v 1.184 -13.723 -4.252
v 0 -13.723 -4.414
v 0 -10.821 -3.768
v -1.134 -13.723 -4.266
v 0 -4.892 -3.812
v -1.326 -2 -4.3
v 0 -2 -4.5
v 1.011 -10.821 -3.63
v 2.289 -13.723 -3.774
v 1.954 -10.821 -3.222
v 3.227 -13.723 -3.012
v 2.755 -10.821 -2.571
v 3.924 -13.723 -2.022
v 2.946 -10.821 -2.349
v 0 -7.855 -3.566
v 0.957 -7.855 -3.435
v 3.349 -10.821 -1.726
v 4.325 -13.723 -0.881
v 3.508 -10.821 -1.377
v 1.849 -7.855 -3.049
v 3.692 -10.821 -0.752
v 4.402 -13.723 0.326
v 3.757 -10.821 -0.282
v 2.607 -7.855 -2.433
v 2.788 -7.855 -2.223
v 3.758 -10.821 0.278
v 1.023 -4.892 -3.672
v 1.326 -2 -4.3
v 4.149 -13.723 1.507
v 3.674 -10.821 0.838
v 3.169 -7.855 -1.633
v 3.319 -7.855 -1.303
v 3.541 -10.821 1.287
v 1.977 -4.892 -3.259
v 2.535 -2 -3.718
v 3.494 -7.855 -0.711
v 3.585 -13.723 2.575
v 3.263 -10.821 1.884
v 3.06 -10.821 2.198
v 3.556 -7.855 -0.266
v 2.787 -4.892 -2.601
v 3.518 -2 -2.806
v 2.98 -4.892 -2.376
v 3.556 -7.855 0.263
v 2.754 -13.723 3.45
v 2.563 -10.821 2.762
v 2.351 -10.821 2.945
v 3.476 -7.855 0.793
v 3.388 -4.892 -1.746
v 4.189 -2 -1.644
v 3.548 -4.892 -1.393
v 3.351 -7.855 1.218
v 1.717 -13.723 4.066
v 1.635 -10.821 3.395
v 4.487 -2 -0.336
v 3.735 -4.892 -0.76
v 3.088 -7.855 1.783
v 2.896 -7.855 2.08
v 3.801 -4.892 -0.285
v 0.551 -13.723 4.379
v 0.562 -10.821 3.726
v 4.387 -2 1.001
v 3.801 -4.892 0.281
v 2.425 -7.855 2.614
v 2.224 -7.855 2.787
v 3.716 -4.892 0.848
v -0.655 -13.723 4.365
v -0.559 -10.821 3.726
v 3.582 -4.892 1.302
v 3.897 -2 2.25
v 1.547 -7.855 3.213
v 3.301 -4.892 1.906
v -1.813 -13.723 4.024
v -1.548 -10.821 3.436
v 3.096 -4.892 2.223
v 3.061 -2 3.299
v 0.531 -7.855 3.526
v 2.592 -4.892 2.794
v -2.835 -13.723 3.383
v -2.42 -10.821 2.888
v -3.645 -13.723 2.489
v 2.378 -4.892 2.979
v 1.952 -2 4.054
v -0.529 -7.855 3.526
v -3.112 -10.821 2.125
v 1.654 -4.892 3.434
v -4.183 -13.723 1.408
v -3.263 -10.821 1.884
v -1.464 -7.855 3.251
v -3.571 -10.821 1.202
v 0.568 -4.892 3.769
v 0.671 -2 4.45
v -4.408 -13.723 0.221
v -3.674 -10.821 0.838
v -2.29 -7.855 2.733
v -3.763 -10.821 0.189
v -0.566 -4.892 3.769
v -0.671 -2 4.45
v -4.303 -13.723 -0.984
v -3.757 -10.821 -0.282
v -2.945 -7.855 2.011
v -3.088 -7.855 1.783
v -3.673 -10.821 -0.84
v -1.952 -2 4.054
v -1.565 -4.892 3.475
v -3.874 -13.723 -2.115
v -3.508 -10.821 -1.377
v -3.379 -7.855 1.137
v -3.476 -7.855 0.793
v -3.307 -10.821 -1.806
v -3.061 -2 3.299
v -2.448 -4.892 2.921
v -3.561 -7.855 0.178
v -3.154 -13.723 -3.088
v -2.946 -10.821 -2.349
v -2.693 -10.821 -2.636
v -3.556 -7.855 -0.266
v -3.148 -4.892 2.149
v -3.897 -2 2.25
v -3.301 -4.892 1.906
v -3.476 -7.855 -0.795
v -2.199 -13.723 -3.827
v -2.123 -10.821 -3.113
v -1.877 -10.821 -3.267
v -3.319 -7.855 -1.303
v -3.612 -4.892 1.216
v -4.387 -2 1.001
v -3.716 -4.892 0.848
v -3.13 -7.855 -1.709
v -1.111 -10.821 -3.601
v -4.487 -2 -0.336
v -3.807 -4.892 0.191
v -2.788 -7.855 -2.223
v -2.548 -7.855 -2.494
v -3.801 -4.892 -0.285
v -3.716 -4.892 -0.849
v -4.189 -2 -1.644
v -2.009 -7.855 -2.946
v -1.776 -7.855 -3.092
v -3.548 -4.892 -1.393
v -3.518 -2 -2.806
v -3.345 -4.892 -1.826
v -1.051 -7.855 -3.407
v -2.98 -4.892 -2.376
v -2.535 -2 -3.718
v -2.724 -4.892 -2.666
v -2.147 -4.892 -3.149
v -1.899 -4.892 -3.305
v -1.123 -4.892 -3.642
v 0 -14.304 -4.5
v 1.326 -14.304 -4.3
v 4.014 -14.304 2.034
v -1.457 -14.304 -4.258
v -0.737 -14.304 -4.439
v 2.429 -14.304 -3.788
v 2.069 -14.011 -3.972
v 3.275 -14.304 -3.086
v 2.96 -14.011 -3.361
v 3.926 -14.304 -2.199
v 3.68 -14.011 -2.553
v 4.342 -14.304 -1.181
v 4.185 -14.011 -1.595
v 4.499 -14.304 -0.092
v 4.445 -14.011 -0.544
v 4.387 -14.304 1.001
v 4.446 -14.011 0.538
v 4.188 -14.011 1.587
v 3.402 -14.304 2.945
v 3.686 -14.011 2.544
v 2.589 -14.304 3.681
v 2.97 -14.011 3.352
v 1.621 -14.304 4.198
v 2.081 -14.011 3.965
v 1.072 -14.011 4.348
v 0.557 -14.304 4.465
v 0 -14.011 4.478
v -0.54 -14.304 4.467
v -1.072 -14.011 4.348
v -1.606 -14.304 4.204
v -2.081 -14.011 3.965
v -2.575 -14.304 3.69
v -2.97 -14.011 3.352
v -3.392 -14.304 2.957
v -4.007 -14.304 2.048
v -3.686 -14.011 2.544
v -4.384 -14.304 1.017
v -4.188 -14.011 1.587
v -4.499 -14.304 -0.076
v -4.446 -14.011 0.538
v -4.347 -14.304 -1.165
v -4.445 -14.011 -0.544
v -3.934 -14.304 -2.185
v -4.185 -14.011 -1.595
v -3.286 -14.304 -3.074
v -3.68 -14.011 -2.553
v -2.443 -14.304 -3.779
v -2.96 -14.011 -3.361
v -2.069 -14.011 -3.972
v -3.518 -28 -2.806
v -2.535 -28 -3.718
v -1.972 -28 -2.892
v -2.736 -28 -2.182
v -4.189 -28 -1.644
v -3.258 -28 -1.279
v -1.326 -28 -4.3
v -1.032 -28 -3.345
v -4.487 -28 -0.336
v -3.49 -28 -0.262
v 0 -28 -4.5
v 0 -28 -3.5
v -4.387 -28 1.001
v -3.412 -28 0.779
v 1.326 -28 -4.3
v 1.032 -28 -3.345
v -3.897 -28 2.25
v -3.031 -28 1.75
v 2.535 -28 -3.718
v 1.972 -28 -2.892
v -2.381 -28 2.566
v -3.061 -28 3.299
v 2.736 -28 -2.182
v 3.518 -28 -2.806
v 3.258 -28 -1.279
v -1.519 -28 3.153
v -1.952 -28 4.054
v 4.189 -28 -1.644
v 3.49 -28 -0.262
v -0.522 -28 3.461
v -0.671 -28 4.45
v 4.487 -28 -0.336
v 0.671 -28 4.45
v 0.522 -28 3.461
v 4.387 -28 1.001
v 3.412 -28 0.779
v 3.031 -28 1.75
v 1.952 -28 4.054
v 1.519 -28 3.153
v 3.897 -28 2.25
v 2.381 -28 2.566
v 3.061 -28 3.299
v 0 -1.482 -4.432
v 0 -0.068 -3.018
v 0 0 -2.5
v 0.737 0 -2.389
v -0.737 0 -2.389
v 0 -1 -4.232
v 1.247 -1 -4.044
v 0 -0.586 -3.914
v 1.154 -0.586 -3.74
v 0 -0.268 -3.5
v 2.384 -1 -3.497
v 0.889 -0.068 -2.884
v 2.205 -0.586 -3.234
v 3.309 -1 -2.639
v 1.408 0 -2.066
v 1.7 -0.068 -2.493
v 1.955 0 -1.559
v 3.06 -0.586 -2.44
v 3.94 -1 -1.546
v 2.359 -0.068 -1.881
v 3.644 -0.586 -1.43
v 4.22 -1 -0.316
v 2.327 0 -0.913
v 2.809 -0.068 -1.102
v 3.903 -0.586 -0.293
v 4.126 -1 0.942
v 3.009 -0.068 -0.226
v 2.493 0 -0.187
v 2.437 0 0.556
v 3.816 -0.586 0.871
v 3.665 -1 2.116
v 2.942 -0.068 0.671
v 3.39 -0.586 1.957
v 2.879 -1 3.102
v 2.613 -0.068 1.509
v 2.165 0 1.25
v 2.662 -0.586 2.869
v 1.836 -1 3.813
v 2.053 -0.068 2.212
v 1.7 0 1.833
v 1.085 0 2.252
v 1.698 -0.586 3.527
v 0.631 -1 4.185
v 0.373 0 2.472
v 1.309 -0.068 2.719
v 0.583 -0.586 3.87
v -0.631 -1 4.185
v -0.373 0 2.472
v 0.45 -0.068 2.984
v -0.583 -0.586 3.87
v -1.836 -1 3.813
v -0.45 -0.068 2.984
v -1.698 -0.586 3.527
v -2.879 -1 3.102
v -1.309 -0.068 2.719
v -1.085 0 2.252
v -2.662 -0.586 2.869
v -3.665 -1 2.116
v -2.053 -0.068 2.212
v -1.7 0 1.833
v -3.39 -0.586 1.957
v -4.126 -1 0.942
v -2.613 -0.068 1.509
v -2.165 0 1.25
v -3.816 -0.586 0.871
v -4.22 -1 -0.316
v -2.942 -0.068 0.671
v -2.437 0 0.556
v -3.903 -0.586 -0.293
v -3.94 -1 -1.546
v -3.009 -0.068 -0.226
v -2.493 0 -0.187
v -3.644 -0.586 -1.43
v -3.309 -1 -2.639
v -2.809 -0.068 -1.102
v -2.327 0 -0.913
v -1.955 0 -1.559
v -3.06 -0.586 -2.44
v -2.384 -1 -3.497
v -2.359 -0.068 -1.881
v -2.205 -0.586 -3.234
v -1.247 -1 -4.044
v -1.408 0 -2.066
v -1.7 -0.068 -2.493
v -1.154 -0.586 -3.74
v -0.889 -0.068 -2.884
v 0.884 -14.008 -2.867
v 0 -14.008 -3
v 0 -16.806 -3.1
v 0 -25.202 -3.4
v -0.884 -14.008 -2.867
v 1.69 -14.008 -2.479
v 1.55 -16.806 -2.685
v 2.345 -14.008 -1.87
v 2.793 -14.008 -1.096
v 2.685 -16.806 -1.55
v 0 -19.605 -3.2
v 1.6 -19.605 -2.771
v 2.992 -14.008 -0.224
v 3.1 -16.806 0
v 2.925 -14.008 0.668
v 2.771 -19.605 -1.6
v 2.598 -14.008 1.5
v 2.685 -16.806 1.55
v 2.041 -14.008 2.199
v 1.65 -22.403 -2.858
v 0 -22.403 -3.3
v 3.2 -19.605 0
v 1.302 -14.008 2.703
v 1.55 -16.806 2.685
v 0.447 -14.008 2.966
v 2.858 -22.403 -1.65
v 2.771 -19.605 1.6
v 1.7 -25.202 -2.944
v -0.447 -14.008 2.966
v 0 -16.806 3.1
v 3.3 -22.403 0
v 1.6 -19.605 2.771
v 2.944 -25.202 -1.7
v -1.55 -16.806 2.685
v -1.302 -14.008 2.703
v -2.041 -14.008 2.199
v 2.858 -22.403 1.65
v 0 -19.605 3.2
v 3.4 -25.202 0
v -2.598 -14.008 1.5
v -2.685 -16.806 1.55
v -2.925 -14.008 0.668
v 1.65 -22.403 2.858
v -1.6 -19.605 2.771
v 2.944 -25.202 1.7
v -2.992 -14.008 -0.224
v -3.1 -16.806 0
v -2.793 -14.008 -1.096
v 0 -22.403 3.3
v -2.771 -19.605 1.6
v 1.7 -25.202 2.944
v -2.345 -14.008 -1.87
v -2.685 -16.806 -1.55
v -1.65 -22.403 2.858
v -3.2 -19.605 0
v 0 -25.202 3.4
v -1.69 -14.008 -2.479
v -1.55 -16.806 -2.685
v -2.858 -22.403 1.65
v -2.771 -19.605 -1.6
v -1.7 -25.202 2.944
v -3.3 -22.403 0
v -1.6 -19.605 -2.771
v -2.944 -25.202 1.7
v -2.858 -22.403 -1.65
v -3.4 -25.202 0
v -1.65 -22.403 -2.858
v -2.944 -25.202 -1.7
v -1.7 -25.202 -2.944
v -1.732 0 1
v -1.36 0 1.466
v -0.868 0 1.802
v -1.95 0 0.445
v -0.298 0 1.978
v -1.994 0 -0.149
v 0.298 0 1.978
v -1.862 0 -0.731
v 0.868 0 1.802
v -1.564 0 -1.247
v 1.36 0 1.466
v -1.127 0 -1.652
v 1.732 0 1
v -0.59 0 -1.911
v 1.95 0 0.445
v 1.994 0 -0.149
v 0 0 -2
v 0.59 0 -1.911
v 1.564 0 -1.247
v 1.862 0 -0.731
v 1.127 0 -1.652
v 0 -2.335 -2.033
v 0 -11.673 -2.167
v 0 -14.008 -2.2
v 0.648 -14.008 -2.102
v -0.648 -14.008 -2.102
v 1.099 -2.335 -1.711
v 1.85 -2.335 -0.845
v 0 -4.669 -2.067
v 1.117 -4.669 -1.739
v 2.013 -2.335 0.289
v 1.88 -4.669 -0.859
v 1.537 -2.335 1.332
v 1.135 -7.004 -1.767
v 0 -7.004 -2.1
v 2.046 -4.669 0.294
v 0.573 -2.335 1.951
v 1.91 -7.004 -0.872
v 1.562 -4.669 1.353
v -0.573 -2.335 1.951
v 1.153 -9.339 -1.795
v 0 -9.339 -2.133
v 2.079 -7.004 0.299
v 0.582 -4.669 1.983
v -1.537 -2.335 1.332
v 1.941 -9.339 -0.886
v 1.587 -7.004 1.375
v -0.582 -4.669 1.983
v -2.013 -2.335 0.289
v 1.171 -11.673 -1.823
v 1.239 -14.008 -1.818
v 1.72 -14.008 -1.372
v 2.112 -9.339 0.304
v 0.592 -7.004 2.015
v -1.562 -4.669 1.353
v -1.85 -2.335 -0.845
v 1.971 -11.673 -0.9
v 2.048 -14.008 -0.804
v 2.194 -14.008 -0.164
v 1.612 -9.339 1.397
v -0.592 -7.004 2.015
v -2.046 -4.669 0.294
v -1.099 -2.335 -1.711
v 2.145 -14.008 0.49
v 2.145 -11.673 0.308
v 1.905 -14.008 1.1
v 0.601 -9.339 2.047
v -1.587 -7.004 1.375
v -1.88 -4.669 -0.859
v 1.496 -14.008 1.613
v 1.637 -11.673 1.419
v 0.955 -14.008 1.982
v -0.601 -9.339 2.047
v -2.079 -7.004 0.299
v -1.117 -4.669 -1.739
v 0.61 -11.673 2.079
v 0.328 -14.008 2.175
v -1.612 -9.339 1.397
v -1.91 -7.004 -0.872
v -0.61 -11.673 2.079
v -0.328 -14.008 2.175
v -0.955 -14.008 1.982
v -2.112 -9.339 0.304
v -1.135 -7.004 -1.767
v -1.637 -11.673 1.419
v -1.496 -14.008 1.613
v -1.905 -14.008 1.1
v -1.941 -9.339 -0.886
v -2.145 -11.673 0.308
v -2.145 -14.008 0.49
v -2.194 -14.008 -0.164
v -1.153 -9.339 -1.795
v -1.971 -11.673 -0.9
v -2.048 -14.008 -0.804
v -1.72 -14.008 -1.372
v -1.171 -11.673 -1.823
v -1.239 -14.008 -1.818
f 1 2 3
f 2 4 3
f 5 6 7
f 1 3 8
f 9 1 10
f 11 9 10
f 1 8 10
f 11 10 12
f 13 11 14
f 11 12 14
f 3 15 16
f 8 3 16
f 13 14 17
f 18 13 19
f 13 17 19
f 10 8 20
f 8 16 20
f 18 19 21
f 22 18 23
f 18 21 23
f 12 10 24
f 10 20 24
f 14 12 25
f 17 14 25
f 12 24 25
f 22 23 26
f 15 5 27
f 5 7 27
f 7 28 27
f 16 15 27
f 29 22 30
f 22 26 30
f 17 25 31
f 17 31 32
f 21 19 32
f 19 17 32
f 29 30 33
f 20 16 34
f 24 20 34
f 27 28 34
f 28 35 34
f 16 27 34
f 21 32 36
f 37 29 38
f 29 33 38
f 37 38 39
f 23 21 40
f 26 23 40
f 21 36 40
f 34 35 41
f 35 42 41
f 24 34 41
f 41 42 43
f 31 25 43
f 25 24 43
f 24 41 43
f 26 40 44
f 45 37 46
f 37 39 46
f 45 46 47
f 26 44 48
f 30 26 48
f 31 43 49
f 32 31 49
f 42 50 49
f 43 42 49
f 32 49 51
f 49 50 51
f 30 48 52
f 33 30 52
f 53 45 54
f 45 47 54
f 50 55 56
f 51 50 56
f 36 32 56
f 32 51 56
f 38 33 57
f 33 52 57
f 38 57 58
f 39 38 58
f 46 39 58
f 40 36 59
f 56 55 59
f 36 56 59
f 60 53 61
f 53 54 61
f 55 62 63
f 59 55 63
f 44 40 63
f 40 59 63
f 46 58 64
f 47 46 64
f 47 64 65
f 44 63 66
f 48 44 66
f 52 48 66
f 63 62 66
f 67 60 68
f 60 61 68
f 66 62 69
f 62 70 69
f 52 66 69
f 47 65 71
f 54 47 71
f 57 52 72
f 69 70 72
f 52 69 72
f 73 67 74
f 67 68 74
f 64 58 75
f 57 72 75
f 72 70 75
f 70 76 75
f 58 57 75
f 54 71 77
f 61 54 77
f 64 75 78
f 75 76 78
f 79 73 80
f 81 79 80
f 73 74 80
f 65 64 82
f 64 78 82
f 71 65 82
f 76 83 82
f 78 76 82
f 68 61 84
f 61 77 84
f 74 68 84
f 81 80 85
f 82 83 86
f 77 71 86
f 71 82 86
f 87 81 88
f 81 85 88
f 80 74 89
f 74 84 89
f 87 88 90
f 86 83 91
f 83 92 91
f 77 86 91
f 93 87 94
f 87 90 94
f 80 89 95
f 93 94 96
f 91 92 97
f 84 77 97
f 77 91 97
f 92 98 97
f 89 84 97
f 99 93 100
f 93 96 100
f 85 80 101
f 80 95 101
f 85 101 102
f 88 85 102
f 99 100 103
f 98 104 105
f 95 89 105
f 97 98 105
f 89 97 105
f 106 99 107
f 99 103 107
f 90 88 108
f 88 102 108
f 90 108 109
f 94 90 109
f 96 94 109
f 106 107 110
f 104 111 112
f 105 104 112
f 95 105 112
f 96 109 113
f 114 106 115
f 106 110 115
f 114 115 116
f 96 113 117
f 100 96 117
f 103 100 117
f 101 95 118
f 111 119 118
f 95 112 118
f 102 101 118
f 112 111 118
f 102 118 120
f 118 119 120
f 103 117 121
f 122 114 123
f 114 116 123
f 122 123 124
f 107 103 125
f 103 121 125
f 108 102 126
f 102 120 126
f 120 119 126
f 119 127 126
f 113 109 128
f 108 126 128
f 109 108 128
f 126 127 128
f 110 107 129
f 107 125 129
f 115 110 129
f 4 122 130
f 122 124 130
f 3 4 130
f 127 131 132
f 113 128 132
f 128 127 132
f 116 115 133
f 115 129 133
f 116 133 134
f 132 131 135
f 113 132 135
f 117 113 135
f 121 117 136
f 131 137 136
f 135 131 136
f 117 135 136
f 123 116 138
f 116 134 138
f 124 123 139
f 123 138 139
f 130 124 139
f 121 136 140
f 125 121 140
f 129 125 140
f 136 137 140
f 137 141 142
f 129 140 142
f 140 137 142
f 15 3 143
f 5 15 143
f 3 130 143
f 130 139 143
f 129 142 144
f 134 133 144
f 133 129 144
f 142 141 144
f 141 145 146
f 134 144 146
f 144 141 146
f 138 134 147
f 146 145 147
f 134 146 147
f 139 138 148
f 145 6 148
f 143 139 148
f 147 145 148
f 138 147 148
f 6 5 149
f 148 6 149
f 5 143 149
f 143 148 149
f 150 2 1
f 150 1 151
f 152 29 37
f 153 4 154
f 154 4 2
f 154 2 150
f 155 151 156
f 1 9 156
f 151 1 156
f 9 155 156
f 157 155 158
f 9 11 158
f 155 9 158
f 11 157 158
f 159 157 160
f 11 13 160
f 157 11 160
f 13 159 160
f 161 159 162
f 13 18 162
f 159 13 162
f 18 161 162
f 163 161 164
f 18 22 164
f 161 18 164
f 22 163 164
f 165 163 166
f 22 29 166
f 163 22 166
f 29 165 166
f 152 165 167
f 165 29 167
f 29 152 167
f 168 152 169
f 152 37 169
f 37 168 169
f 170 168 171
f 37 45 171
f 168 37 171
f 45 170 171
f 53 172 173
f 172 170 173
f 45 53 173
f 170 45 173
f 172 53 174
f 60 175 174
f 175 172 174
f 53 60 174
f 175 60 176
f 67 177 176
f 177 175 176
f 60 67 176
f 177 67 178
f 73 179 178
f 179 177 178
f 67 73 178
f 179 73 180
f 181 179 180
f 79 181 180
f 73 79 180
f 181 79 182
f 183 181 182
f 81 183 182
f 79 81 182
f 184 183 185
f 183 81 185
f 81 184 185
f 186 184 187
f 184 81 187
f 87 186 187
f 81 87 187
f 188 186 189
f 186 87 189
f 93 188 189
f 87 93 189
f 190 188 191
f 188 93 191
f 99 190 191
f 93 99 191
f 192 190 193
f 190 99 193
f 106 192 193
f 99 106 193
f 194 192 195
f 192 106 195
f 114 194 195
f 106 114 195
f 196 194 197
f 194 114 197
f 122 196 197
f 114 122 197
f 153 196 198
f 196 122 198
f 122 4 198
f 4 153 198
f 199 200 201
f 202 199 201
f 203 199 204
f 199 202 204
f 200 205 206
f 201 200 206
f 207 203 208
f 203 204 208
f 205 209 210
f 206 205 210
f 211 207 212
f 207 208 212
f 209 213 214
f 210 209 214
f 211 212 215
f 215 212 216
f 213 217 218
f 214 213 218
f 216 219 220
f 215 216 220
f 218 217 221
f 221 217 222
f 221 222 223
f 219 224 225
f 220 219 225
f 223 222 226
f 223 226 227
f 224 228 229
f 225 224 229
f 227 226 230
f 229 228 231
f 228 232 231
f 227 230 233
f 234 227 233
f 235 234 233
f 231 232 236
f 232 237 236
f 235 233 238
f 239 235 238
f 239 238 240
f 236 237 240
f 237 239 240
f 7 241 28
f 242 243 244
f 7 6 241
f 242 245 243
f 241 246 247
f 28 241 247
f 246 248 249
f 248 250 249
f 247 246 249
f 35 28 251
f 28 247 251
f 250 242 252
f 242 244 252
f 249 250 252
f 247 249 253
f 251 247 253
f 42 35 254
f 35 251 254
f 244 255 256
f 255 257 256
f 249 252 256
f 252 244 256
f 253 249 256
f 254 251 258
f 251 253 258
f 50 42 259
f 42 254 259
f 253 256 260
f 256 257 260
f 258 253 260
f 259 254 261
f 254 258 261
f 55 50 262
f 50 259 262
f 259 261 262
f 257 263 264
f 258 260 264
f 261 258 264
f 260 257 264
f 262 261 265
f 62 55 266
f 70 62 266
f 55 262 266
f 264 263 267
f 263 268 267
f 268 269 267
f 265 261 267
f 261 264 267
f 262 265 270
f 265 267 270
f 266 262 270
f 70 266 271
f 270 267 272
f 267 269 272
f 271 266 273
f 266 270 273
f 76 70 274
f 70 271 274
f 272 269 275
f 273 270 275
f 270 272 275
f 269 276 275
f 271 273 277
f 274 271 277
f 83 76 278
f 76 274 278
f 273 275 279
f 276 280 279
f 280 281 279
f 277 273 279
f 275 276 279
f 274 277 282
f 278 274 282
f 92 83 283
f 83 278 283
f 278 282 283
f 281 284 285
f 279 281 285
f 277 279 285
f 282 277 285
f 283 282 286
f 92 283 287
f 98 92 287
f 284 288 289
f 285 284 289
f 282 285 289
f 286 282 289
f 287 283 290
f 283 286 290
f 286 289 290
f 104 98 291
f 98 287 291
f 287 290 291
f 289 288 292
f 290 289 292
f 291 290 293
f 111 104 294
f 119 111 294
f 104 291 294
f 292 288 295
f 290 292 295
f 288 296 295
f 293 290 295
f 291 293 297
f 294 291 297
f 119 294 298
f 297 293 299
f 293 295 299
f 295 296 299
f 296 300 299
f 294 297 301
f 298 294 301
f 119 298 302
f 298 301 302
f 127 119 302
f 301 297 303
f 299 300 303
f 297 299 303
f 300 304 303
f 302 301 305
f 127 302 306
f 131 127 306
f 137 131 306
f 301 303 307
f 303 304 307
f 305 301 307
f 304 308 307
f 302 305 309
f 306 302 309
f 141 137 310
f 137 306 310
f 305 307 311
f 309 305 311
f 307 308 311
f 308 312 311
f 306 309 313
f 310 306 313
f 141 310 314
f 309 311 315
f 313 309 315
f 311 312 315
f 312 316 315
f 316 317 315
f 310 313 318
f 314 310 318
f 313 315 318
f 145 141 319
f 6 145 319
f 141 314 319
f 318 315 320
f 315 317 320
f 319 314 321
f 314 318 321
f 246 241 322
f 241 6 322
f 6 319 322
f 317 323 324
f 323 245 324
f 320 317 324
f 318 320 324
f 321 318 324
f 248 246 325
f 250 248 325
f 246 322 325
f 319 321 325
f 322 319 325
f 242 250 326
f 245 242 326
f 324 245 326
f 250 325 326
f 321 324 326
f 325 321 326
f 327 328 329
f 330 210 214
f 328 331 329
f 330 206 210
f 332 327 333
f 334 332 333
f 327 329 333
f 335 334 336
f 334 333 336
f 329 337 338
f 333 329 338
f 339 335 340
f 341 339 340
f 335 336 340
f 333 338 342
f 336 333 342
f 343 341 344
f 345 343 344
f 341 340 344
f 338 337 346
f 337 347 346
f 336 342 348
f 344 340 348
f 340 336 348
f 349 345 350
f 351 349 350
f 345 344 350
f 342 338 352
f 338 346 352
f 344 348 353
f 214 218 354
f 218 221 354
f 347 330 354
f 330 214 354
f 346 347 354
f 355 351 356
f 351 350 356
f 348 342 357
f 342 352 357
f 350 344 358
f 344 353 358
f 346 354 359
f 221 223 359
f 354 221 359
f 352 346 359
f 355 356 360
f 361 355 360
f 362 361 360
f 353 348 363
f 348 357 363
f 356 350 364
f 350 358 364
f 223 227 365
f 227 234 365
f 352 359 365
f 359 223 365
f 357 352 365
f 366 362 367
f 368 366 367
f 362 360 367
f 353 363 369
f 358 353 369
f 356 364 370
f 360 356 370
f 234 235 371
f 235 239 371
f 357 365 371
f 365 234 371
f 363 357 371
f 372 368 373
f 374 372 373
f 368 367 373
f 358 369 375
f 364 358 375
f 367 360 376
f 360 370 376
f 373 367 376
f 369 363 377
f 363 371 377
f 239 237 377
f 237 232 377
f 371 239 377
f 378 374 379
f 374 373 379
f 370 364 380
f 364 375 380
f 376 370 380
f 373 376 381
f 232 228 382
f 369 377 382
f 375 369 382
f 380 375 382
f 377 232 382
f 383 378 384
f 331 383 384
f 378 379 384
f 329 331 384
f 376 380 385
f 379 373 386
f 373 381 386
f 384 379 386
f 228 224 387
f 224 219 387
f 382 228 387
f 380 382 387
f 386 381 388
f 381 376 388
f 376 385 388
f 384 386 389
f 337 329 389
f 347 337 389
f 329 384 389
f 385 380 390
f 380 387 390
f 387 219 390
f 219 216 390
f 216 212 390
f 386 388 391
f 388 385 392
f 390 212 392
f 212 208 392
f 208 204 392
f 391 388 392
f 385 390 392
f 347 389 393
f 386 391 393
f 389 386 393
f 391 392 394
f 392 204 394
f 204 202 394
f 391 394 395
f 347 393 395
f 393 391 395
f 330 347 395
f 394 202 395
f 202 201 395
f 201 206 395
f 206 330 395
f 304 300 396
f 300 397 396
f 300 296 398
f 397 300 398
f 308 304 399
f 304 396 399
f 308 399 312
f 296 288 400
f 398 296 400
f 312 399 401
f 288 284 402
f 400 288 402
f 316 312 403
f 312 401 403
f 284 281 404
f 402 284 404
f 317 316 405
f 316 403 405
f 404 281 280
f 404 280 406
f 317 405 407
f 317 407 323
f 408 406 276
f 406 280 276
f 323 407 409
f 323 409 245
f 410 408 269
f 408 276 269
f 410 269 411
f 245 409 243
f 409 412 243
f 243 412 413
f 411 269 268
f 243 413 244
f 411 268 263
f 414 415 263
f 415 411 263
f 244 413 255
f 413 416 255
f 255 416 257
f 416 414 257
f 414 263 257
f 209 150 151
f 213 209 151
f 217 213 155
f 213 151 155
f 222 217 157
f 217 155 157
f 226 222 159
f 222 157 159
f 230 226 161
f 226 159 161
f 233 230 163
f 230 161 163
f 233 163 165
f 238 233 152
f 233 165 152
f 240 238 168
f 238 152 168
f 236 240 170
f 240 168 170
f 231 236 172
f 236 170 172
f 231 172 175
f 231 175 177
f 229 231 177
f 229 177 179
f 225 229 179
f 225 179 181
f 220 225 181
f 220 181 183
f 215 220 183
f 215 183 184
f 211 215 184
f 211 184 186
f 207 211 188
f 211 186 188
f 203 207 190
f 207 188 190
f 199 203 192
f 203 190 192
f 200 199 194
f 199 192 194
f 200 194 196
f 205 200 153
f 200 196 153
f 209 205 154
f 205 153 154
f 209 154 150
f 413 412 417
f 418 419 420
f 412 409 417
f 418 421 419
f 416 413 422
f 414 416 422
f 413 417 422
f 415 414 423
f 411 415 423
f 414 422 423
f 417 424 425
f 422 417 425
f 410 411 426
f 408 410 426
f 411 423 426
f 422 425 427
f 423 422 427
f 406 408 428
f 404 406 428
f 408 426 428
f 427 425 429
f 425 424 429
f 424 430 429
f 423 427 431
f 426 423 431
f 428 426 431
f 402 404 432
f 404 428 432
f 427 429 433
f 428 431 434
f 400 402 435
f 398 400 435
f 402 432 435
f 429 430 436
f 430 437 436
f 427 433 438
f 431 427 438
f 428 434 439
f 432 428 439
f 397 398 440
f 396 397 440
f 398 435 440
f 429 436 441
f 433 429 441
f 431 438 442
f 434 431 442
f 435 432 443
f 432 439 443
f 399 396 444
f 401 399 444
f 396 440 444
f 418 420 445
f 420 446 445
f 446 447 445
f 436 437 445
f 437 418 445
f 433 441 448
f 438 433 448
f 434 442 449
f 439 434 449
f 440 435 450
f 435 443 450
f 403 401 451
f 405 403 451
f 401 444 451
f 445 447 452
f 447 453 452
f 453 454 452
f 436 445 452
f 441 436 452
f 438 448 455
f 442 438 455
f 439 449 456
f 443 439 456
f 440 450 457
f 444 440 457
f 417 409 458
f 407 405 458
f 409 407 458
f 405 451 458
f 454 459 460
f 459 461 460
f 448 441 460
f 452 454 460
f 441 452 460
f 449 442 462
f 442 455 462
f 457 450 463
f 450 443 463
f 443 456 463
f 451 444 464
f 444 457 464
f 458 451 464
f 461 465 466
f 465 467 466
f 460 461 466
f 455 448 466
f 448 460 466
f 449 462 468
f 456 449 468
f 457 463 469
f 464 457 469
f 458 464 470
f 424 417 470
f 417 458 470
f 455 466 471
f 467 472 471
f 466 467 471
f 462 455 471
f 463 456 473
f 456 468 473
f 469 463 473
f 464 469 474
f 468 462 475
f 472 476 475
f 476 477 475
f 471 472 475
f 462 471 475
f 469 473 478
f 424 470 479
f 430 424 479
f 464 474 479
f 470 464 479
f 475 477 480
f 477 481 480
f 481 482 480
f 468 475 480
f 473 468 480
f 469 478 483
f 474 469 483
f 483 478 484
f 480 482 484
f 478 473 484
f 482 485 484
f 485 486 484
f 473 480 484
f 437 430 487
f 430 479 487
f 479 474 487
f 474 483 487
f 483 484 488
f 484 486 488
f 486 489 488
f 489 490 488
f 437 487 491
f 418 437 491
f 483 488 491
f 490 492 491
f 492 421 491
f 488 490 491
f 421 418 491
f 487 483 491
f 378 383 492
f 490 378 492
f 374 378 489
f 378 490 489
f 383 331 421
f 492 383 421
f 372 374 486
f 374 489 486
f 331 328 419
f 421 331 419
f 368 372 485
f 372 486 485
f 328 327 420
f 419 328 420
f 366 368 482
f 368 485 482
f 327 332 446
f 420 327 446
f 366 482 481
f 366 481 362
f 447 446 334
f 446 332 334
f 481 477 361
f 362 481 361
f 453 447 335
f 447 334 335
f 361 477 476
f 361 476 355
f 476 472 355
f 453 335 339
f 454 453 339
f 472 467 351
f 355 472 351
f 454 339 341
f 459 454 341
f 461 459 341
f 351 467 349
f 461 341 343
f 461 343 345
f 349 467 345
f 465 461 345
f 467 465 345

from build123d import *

# Parameters (mm, degrees)
F2_R = 1.99999
F3_R = 2


# Not quite as in the source:
# - a fillet or chamfer is up to 0.001 mm smaller than in the source, because OpenCascade refuses the exact size


with BuildPart() as f1:
    # F0 (on Right) → F1 (revolve)
    with BuildSketch(Plane.YZ):
        with BuildLine():
            Line((-2, -4.5), (0, -4.5))
            Line((0, -4.5), (0, -2))
            Line((0, -2), (-14.007930782, -2.2))
            Line((-14.007930782, -2.2), (-14.007930782, -3))
            Line((-14.007930782, -3), (-28, -3.5))
            Line((-28, -3.5), (-28, -4.5))
            Line((-28, -4.5), (-14, -4.5))
            ThreePointArc((-14, -4.5), (-8, -3.5651046907), (-2, -4.5))
        make_face()
    revolve(axis=Axis((0, -15.99, 0), (0, -1, 0)))

    # F2 (radius 2 in the source; OpenCascade refuses exactly that, so slightly less here)
    f2_edges = [f1.edges().sort_by_distance(p)[0] for p in [
        (0, 0, 4.5),
    ]]
    fillet(f2_edges, radius=F2_R)

    # F3
    f3_edges = [f1.edges().sort_by_distance(p)[0] for p in [
        (0, -14, 4.5),
    ]]
    fillet(f3_edges, radius=F3_R)


solid = f1.part
